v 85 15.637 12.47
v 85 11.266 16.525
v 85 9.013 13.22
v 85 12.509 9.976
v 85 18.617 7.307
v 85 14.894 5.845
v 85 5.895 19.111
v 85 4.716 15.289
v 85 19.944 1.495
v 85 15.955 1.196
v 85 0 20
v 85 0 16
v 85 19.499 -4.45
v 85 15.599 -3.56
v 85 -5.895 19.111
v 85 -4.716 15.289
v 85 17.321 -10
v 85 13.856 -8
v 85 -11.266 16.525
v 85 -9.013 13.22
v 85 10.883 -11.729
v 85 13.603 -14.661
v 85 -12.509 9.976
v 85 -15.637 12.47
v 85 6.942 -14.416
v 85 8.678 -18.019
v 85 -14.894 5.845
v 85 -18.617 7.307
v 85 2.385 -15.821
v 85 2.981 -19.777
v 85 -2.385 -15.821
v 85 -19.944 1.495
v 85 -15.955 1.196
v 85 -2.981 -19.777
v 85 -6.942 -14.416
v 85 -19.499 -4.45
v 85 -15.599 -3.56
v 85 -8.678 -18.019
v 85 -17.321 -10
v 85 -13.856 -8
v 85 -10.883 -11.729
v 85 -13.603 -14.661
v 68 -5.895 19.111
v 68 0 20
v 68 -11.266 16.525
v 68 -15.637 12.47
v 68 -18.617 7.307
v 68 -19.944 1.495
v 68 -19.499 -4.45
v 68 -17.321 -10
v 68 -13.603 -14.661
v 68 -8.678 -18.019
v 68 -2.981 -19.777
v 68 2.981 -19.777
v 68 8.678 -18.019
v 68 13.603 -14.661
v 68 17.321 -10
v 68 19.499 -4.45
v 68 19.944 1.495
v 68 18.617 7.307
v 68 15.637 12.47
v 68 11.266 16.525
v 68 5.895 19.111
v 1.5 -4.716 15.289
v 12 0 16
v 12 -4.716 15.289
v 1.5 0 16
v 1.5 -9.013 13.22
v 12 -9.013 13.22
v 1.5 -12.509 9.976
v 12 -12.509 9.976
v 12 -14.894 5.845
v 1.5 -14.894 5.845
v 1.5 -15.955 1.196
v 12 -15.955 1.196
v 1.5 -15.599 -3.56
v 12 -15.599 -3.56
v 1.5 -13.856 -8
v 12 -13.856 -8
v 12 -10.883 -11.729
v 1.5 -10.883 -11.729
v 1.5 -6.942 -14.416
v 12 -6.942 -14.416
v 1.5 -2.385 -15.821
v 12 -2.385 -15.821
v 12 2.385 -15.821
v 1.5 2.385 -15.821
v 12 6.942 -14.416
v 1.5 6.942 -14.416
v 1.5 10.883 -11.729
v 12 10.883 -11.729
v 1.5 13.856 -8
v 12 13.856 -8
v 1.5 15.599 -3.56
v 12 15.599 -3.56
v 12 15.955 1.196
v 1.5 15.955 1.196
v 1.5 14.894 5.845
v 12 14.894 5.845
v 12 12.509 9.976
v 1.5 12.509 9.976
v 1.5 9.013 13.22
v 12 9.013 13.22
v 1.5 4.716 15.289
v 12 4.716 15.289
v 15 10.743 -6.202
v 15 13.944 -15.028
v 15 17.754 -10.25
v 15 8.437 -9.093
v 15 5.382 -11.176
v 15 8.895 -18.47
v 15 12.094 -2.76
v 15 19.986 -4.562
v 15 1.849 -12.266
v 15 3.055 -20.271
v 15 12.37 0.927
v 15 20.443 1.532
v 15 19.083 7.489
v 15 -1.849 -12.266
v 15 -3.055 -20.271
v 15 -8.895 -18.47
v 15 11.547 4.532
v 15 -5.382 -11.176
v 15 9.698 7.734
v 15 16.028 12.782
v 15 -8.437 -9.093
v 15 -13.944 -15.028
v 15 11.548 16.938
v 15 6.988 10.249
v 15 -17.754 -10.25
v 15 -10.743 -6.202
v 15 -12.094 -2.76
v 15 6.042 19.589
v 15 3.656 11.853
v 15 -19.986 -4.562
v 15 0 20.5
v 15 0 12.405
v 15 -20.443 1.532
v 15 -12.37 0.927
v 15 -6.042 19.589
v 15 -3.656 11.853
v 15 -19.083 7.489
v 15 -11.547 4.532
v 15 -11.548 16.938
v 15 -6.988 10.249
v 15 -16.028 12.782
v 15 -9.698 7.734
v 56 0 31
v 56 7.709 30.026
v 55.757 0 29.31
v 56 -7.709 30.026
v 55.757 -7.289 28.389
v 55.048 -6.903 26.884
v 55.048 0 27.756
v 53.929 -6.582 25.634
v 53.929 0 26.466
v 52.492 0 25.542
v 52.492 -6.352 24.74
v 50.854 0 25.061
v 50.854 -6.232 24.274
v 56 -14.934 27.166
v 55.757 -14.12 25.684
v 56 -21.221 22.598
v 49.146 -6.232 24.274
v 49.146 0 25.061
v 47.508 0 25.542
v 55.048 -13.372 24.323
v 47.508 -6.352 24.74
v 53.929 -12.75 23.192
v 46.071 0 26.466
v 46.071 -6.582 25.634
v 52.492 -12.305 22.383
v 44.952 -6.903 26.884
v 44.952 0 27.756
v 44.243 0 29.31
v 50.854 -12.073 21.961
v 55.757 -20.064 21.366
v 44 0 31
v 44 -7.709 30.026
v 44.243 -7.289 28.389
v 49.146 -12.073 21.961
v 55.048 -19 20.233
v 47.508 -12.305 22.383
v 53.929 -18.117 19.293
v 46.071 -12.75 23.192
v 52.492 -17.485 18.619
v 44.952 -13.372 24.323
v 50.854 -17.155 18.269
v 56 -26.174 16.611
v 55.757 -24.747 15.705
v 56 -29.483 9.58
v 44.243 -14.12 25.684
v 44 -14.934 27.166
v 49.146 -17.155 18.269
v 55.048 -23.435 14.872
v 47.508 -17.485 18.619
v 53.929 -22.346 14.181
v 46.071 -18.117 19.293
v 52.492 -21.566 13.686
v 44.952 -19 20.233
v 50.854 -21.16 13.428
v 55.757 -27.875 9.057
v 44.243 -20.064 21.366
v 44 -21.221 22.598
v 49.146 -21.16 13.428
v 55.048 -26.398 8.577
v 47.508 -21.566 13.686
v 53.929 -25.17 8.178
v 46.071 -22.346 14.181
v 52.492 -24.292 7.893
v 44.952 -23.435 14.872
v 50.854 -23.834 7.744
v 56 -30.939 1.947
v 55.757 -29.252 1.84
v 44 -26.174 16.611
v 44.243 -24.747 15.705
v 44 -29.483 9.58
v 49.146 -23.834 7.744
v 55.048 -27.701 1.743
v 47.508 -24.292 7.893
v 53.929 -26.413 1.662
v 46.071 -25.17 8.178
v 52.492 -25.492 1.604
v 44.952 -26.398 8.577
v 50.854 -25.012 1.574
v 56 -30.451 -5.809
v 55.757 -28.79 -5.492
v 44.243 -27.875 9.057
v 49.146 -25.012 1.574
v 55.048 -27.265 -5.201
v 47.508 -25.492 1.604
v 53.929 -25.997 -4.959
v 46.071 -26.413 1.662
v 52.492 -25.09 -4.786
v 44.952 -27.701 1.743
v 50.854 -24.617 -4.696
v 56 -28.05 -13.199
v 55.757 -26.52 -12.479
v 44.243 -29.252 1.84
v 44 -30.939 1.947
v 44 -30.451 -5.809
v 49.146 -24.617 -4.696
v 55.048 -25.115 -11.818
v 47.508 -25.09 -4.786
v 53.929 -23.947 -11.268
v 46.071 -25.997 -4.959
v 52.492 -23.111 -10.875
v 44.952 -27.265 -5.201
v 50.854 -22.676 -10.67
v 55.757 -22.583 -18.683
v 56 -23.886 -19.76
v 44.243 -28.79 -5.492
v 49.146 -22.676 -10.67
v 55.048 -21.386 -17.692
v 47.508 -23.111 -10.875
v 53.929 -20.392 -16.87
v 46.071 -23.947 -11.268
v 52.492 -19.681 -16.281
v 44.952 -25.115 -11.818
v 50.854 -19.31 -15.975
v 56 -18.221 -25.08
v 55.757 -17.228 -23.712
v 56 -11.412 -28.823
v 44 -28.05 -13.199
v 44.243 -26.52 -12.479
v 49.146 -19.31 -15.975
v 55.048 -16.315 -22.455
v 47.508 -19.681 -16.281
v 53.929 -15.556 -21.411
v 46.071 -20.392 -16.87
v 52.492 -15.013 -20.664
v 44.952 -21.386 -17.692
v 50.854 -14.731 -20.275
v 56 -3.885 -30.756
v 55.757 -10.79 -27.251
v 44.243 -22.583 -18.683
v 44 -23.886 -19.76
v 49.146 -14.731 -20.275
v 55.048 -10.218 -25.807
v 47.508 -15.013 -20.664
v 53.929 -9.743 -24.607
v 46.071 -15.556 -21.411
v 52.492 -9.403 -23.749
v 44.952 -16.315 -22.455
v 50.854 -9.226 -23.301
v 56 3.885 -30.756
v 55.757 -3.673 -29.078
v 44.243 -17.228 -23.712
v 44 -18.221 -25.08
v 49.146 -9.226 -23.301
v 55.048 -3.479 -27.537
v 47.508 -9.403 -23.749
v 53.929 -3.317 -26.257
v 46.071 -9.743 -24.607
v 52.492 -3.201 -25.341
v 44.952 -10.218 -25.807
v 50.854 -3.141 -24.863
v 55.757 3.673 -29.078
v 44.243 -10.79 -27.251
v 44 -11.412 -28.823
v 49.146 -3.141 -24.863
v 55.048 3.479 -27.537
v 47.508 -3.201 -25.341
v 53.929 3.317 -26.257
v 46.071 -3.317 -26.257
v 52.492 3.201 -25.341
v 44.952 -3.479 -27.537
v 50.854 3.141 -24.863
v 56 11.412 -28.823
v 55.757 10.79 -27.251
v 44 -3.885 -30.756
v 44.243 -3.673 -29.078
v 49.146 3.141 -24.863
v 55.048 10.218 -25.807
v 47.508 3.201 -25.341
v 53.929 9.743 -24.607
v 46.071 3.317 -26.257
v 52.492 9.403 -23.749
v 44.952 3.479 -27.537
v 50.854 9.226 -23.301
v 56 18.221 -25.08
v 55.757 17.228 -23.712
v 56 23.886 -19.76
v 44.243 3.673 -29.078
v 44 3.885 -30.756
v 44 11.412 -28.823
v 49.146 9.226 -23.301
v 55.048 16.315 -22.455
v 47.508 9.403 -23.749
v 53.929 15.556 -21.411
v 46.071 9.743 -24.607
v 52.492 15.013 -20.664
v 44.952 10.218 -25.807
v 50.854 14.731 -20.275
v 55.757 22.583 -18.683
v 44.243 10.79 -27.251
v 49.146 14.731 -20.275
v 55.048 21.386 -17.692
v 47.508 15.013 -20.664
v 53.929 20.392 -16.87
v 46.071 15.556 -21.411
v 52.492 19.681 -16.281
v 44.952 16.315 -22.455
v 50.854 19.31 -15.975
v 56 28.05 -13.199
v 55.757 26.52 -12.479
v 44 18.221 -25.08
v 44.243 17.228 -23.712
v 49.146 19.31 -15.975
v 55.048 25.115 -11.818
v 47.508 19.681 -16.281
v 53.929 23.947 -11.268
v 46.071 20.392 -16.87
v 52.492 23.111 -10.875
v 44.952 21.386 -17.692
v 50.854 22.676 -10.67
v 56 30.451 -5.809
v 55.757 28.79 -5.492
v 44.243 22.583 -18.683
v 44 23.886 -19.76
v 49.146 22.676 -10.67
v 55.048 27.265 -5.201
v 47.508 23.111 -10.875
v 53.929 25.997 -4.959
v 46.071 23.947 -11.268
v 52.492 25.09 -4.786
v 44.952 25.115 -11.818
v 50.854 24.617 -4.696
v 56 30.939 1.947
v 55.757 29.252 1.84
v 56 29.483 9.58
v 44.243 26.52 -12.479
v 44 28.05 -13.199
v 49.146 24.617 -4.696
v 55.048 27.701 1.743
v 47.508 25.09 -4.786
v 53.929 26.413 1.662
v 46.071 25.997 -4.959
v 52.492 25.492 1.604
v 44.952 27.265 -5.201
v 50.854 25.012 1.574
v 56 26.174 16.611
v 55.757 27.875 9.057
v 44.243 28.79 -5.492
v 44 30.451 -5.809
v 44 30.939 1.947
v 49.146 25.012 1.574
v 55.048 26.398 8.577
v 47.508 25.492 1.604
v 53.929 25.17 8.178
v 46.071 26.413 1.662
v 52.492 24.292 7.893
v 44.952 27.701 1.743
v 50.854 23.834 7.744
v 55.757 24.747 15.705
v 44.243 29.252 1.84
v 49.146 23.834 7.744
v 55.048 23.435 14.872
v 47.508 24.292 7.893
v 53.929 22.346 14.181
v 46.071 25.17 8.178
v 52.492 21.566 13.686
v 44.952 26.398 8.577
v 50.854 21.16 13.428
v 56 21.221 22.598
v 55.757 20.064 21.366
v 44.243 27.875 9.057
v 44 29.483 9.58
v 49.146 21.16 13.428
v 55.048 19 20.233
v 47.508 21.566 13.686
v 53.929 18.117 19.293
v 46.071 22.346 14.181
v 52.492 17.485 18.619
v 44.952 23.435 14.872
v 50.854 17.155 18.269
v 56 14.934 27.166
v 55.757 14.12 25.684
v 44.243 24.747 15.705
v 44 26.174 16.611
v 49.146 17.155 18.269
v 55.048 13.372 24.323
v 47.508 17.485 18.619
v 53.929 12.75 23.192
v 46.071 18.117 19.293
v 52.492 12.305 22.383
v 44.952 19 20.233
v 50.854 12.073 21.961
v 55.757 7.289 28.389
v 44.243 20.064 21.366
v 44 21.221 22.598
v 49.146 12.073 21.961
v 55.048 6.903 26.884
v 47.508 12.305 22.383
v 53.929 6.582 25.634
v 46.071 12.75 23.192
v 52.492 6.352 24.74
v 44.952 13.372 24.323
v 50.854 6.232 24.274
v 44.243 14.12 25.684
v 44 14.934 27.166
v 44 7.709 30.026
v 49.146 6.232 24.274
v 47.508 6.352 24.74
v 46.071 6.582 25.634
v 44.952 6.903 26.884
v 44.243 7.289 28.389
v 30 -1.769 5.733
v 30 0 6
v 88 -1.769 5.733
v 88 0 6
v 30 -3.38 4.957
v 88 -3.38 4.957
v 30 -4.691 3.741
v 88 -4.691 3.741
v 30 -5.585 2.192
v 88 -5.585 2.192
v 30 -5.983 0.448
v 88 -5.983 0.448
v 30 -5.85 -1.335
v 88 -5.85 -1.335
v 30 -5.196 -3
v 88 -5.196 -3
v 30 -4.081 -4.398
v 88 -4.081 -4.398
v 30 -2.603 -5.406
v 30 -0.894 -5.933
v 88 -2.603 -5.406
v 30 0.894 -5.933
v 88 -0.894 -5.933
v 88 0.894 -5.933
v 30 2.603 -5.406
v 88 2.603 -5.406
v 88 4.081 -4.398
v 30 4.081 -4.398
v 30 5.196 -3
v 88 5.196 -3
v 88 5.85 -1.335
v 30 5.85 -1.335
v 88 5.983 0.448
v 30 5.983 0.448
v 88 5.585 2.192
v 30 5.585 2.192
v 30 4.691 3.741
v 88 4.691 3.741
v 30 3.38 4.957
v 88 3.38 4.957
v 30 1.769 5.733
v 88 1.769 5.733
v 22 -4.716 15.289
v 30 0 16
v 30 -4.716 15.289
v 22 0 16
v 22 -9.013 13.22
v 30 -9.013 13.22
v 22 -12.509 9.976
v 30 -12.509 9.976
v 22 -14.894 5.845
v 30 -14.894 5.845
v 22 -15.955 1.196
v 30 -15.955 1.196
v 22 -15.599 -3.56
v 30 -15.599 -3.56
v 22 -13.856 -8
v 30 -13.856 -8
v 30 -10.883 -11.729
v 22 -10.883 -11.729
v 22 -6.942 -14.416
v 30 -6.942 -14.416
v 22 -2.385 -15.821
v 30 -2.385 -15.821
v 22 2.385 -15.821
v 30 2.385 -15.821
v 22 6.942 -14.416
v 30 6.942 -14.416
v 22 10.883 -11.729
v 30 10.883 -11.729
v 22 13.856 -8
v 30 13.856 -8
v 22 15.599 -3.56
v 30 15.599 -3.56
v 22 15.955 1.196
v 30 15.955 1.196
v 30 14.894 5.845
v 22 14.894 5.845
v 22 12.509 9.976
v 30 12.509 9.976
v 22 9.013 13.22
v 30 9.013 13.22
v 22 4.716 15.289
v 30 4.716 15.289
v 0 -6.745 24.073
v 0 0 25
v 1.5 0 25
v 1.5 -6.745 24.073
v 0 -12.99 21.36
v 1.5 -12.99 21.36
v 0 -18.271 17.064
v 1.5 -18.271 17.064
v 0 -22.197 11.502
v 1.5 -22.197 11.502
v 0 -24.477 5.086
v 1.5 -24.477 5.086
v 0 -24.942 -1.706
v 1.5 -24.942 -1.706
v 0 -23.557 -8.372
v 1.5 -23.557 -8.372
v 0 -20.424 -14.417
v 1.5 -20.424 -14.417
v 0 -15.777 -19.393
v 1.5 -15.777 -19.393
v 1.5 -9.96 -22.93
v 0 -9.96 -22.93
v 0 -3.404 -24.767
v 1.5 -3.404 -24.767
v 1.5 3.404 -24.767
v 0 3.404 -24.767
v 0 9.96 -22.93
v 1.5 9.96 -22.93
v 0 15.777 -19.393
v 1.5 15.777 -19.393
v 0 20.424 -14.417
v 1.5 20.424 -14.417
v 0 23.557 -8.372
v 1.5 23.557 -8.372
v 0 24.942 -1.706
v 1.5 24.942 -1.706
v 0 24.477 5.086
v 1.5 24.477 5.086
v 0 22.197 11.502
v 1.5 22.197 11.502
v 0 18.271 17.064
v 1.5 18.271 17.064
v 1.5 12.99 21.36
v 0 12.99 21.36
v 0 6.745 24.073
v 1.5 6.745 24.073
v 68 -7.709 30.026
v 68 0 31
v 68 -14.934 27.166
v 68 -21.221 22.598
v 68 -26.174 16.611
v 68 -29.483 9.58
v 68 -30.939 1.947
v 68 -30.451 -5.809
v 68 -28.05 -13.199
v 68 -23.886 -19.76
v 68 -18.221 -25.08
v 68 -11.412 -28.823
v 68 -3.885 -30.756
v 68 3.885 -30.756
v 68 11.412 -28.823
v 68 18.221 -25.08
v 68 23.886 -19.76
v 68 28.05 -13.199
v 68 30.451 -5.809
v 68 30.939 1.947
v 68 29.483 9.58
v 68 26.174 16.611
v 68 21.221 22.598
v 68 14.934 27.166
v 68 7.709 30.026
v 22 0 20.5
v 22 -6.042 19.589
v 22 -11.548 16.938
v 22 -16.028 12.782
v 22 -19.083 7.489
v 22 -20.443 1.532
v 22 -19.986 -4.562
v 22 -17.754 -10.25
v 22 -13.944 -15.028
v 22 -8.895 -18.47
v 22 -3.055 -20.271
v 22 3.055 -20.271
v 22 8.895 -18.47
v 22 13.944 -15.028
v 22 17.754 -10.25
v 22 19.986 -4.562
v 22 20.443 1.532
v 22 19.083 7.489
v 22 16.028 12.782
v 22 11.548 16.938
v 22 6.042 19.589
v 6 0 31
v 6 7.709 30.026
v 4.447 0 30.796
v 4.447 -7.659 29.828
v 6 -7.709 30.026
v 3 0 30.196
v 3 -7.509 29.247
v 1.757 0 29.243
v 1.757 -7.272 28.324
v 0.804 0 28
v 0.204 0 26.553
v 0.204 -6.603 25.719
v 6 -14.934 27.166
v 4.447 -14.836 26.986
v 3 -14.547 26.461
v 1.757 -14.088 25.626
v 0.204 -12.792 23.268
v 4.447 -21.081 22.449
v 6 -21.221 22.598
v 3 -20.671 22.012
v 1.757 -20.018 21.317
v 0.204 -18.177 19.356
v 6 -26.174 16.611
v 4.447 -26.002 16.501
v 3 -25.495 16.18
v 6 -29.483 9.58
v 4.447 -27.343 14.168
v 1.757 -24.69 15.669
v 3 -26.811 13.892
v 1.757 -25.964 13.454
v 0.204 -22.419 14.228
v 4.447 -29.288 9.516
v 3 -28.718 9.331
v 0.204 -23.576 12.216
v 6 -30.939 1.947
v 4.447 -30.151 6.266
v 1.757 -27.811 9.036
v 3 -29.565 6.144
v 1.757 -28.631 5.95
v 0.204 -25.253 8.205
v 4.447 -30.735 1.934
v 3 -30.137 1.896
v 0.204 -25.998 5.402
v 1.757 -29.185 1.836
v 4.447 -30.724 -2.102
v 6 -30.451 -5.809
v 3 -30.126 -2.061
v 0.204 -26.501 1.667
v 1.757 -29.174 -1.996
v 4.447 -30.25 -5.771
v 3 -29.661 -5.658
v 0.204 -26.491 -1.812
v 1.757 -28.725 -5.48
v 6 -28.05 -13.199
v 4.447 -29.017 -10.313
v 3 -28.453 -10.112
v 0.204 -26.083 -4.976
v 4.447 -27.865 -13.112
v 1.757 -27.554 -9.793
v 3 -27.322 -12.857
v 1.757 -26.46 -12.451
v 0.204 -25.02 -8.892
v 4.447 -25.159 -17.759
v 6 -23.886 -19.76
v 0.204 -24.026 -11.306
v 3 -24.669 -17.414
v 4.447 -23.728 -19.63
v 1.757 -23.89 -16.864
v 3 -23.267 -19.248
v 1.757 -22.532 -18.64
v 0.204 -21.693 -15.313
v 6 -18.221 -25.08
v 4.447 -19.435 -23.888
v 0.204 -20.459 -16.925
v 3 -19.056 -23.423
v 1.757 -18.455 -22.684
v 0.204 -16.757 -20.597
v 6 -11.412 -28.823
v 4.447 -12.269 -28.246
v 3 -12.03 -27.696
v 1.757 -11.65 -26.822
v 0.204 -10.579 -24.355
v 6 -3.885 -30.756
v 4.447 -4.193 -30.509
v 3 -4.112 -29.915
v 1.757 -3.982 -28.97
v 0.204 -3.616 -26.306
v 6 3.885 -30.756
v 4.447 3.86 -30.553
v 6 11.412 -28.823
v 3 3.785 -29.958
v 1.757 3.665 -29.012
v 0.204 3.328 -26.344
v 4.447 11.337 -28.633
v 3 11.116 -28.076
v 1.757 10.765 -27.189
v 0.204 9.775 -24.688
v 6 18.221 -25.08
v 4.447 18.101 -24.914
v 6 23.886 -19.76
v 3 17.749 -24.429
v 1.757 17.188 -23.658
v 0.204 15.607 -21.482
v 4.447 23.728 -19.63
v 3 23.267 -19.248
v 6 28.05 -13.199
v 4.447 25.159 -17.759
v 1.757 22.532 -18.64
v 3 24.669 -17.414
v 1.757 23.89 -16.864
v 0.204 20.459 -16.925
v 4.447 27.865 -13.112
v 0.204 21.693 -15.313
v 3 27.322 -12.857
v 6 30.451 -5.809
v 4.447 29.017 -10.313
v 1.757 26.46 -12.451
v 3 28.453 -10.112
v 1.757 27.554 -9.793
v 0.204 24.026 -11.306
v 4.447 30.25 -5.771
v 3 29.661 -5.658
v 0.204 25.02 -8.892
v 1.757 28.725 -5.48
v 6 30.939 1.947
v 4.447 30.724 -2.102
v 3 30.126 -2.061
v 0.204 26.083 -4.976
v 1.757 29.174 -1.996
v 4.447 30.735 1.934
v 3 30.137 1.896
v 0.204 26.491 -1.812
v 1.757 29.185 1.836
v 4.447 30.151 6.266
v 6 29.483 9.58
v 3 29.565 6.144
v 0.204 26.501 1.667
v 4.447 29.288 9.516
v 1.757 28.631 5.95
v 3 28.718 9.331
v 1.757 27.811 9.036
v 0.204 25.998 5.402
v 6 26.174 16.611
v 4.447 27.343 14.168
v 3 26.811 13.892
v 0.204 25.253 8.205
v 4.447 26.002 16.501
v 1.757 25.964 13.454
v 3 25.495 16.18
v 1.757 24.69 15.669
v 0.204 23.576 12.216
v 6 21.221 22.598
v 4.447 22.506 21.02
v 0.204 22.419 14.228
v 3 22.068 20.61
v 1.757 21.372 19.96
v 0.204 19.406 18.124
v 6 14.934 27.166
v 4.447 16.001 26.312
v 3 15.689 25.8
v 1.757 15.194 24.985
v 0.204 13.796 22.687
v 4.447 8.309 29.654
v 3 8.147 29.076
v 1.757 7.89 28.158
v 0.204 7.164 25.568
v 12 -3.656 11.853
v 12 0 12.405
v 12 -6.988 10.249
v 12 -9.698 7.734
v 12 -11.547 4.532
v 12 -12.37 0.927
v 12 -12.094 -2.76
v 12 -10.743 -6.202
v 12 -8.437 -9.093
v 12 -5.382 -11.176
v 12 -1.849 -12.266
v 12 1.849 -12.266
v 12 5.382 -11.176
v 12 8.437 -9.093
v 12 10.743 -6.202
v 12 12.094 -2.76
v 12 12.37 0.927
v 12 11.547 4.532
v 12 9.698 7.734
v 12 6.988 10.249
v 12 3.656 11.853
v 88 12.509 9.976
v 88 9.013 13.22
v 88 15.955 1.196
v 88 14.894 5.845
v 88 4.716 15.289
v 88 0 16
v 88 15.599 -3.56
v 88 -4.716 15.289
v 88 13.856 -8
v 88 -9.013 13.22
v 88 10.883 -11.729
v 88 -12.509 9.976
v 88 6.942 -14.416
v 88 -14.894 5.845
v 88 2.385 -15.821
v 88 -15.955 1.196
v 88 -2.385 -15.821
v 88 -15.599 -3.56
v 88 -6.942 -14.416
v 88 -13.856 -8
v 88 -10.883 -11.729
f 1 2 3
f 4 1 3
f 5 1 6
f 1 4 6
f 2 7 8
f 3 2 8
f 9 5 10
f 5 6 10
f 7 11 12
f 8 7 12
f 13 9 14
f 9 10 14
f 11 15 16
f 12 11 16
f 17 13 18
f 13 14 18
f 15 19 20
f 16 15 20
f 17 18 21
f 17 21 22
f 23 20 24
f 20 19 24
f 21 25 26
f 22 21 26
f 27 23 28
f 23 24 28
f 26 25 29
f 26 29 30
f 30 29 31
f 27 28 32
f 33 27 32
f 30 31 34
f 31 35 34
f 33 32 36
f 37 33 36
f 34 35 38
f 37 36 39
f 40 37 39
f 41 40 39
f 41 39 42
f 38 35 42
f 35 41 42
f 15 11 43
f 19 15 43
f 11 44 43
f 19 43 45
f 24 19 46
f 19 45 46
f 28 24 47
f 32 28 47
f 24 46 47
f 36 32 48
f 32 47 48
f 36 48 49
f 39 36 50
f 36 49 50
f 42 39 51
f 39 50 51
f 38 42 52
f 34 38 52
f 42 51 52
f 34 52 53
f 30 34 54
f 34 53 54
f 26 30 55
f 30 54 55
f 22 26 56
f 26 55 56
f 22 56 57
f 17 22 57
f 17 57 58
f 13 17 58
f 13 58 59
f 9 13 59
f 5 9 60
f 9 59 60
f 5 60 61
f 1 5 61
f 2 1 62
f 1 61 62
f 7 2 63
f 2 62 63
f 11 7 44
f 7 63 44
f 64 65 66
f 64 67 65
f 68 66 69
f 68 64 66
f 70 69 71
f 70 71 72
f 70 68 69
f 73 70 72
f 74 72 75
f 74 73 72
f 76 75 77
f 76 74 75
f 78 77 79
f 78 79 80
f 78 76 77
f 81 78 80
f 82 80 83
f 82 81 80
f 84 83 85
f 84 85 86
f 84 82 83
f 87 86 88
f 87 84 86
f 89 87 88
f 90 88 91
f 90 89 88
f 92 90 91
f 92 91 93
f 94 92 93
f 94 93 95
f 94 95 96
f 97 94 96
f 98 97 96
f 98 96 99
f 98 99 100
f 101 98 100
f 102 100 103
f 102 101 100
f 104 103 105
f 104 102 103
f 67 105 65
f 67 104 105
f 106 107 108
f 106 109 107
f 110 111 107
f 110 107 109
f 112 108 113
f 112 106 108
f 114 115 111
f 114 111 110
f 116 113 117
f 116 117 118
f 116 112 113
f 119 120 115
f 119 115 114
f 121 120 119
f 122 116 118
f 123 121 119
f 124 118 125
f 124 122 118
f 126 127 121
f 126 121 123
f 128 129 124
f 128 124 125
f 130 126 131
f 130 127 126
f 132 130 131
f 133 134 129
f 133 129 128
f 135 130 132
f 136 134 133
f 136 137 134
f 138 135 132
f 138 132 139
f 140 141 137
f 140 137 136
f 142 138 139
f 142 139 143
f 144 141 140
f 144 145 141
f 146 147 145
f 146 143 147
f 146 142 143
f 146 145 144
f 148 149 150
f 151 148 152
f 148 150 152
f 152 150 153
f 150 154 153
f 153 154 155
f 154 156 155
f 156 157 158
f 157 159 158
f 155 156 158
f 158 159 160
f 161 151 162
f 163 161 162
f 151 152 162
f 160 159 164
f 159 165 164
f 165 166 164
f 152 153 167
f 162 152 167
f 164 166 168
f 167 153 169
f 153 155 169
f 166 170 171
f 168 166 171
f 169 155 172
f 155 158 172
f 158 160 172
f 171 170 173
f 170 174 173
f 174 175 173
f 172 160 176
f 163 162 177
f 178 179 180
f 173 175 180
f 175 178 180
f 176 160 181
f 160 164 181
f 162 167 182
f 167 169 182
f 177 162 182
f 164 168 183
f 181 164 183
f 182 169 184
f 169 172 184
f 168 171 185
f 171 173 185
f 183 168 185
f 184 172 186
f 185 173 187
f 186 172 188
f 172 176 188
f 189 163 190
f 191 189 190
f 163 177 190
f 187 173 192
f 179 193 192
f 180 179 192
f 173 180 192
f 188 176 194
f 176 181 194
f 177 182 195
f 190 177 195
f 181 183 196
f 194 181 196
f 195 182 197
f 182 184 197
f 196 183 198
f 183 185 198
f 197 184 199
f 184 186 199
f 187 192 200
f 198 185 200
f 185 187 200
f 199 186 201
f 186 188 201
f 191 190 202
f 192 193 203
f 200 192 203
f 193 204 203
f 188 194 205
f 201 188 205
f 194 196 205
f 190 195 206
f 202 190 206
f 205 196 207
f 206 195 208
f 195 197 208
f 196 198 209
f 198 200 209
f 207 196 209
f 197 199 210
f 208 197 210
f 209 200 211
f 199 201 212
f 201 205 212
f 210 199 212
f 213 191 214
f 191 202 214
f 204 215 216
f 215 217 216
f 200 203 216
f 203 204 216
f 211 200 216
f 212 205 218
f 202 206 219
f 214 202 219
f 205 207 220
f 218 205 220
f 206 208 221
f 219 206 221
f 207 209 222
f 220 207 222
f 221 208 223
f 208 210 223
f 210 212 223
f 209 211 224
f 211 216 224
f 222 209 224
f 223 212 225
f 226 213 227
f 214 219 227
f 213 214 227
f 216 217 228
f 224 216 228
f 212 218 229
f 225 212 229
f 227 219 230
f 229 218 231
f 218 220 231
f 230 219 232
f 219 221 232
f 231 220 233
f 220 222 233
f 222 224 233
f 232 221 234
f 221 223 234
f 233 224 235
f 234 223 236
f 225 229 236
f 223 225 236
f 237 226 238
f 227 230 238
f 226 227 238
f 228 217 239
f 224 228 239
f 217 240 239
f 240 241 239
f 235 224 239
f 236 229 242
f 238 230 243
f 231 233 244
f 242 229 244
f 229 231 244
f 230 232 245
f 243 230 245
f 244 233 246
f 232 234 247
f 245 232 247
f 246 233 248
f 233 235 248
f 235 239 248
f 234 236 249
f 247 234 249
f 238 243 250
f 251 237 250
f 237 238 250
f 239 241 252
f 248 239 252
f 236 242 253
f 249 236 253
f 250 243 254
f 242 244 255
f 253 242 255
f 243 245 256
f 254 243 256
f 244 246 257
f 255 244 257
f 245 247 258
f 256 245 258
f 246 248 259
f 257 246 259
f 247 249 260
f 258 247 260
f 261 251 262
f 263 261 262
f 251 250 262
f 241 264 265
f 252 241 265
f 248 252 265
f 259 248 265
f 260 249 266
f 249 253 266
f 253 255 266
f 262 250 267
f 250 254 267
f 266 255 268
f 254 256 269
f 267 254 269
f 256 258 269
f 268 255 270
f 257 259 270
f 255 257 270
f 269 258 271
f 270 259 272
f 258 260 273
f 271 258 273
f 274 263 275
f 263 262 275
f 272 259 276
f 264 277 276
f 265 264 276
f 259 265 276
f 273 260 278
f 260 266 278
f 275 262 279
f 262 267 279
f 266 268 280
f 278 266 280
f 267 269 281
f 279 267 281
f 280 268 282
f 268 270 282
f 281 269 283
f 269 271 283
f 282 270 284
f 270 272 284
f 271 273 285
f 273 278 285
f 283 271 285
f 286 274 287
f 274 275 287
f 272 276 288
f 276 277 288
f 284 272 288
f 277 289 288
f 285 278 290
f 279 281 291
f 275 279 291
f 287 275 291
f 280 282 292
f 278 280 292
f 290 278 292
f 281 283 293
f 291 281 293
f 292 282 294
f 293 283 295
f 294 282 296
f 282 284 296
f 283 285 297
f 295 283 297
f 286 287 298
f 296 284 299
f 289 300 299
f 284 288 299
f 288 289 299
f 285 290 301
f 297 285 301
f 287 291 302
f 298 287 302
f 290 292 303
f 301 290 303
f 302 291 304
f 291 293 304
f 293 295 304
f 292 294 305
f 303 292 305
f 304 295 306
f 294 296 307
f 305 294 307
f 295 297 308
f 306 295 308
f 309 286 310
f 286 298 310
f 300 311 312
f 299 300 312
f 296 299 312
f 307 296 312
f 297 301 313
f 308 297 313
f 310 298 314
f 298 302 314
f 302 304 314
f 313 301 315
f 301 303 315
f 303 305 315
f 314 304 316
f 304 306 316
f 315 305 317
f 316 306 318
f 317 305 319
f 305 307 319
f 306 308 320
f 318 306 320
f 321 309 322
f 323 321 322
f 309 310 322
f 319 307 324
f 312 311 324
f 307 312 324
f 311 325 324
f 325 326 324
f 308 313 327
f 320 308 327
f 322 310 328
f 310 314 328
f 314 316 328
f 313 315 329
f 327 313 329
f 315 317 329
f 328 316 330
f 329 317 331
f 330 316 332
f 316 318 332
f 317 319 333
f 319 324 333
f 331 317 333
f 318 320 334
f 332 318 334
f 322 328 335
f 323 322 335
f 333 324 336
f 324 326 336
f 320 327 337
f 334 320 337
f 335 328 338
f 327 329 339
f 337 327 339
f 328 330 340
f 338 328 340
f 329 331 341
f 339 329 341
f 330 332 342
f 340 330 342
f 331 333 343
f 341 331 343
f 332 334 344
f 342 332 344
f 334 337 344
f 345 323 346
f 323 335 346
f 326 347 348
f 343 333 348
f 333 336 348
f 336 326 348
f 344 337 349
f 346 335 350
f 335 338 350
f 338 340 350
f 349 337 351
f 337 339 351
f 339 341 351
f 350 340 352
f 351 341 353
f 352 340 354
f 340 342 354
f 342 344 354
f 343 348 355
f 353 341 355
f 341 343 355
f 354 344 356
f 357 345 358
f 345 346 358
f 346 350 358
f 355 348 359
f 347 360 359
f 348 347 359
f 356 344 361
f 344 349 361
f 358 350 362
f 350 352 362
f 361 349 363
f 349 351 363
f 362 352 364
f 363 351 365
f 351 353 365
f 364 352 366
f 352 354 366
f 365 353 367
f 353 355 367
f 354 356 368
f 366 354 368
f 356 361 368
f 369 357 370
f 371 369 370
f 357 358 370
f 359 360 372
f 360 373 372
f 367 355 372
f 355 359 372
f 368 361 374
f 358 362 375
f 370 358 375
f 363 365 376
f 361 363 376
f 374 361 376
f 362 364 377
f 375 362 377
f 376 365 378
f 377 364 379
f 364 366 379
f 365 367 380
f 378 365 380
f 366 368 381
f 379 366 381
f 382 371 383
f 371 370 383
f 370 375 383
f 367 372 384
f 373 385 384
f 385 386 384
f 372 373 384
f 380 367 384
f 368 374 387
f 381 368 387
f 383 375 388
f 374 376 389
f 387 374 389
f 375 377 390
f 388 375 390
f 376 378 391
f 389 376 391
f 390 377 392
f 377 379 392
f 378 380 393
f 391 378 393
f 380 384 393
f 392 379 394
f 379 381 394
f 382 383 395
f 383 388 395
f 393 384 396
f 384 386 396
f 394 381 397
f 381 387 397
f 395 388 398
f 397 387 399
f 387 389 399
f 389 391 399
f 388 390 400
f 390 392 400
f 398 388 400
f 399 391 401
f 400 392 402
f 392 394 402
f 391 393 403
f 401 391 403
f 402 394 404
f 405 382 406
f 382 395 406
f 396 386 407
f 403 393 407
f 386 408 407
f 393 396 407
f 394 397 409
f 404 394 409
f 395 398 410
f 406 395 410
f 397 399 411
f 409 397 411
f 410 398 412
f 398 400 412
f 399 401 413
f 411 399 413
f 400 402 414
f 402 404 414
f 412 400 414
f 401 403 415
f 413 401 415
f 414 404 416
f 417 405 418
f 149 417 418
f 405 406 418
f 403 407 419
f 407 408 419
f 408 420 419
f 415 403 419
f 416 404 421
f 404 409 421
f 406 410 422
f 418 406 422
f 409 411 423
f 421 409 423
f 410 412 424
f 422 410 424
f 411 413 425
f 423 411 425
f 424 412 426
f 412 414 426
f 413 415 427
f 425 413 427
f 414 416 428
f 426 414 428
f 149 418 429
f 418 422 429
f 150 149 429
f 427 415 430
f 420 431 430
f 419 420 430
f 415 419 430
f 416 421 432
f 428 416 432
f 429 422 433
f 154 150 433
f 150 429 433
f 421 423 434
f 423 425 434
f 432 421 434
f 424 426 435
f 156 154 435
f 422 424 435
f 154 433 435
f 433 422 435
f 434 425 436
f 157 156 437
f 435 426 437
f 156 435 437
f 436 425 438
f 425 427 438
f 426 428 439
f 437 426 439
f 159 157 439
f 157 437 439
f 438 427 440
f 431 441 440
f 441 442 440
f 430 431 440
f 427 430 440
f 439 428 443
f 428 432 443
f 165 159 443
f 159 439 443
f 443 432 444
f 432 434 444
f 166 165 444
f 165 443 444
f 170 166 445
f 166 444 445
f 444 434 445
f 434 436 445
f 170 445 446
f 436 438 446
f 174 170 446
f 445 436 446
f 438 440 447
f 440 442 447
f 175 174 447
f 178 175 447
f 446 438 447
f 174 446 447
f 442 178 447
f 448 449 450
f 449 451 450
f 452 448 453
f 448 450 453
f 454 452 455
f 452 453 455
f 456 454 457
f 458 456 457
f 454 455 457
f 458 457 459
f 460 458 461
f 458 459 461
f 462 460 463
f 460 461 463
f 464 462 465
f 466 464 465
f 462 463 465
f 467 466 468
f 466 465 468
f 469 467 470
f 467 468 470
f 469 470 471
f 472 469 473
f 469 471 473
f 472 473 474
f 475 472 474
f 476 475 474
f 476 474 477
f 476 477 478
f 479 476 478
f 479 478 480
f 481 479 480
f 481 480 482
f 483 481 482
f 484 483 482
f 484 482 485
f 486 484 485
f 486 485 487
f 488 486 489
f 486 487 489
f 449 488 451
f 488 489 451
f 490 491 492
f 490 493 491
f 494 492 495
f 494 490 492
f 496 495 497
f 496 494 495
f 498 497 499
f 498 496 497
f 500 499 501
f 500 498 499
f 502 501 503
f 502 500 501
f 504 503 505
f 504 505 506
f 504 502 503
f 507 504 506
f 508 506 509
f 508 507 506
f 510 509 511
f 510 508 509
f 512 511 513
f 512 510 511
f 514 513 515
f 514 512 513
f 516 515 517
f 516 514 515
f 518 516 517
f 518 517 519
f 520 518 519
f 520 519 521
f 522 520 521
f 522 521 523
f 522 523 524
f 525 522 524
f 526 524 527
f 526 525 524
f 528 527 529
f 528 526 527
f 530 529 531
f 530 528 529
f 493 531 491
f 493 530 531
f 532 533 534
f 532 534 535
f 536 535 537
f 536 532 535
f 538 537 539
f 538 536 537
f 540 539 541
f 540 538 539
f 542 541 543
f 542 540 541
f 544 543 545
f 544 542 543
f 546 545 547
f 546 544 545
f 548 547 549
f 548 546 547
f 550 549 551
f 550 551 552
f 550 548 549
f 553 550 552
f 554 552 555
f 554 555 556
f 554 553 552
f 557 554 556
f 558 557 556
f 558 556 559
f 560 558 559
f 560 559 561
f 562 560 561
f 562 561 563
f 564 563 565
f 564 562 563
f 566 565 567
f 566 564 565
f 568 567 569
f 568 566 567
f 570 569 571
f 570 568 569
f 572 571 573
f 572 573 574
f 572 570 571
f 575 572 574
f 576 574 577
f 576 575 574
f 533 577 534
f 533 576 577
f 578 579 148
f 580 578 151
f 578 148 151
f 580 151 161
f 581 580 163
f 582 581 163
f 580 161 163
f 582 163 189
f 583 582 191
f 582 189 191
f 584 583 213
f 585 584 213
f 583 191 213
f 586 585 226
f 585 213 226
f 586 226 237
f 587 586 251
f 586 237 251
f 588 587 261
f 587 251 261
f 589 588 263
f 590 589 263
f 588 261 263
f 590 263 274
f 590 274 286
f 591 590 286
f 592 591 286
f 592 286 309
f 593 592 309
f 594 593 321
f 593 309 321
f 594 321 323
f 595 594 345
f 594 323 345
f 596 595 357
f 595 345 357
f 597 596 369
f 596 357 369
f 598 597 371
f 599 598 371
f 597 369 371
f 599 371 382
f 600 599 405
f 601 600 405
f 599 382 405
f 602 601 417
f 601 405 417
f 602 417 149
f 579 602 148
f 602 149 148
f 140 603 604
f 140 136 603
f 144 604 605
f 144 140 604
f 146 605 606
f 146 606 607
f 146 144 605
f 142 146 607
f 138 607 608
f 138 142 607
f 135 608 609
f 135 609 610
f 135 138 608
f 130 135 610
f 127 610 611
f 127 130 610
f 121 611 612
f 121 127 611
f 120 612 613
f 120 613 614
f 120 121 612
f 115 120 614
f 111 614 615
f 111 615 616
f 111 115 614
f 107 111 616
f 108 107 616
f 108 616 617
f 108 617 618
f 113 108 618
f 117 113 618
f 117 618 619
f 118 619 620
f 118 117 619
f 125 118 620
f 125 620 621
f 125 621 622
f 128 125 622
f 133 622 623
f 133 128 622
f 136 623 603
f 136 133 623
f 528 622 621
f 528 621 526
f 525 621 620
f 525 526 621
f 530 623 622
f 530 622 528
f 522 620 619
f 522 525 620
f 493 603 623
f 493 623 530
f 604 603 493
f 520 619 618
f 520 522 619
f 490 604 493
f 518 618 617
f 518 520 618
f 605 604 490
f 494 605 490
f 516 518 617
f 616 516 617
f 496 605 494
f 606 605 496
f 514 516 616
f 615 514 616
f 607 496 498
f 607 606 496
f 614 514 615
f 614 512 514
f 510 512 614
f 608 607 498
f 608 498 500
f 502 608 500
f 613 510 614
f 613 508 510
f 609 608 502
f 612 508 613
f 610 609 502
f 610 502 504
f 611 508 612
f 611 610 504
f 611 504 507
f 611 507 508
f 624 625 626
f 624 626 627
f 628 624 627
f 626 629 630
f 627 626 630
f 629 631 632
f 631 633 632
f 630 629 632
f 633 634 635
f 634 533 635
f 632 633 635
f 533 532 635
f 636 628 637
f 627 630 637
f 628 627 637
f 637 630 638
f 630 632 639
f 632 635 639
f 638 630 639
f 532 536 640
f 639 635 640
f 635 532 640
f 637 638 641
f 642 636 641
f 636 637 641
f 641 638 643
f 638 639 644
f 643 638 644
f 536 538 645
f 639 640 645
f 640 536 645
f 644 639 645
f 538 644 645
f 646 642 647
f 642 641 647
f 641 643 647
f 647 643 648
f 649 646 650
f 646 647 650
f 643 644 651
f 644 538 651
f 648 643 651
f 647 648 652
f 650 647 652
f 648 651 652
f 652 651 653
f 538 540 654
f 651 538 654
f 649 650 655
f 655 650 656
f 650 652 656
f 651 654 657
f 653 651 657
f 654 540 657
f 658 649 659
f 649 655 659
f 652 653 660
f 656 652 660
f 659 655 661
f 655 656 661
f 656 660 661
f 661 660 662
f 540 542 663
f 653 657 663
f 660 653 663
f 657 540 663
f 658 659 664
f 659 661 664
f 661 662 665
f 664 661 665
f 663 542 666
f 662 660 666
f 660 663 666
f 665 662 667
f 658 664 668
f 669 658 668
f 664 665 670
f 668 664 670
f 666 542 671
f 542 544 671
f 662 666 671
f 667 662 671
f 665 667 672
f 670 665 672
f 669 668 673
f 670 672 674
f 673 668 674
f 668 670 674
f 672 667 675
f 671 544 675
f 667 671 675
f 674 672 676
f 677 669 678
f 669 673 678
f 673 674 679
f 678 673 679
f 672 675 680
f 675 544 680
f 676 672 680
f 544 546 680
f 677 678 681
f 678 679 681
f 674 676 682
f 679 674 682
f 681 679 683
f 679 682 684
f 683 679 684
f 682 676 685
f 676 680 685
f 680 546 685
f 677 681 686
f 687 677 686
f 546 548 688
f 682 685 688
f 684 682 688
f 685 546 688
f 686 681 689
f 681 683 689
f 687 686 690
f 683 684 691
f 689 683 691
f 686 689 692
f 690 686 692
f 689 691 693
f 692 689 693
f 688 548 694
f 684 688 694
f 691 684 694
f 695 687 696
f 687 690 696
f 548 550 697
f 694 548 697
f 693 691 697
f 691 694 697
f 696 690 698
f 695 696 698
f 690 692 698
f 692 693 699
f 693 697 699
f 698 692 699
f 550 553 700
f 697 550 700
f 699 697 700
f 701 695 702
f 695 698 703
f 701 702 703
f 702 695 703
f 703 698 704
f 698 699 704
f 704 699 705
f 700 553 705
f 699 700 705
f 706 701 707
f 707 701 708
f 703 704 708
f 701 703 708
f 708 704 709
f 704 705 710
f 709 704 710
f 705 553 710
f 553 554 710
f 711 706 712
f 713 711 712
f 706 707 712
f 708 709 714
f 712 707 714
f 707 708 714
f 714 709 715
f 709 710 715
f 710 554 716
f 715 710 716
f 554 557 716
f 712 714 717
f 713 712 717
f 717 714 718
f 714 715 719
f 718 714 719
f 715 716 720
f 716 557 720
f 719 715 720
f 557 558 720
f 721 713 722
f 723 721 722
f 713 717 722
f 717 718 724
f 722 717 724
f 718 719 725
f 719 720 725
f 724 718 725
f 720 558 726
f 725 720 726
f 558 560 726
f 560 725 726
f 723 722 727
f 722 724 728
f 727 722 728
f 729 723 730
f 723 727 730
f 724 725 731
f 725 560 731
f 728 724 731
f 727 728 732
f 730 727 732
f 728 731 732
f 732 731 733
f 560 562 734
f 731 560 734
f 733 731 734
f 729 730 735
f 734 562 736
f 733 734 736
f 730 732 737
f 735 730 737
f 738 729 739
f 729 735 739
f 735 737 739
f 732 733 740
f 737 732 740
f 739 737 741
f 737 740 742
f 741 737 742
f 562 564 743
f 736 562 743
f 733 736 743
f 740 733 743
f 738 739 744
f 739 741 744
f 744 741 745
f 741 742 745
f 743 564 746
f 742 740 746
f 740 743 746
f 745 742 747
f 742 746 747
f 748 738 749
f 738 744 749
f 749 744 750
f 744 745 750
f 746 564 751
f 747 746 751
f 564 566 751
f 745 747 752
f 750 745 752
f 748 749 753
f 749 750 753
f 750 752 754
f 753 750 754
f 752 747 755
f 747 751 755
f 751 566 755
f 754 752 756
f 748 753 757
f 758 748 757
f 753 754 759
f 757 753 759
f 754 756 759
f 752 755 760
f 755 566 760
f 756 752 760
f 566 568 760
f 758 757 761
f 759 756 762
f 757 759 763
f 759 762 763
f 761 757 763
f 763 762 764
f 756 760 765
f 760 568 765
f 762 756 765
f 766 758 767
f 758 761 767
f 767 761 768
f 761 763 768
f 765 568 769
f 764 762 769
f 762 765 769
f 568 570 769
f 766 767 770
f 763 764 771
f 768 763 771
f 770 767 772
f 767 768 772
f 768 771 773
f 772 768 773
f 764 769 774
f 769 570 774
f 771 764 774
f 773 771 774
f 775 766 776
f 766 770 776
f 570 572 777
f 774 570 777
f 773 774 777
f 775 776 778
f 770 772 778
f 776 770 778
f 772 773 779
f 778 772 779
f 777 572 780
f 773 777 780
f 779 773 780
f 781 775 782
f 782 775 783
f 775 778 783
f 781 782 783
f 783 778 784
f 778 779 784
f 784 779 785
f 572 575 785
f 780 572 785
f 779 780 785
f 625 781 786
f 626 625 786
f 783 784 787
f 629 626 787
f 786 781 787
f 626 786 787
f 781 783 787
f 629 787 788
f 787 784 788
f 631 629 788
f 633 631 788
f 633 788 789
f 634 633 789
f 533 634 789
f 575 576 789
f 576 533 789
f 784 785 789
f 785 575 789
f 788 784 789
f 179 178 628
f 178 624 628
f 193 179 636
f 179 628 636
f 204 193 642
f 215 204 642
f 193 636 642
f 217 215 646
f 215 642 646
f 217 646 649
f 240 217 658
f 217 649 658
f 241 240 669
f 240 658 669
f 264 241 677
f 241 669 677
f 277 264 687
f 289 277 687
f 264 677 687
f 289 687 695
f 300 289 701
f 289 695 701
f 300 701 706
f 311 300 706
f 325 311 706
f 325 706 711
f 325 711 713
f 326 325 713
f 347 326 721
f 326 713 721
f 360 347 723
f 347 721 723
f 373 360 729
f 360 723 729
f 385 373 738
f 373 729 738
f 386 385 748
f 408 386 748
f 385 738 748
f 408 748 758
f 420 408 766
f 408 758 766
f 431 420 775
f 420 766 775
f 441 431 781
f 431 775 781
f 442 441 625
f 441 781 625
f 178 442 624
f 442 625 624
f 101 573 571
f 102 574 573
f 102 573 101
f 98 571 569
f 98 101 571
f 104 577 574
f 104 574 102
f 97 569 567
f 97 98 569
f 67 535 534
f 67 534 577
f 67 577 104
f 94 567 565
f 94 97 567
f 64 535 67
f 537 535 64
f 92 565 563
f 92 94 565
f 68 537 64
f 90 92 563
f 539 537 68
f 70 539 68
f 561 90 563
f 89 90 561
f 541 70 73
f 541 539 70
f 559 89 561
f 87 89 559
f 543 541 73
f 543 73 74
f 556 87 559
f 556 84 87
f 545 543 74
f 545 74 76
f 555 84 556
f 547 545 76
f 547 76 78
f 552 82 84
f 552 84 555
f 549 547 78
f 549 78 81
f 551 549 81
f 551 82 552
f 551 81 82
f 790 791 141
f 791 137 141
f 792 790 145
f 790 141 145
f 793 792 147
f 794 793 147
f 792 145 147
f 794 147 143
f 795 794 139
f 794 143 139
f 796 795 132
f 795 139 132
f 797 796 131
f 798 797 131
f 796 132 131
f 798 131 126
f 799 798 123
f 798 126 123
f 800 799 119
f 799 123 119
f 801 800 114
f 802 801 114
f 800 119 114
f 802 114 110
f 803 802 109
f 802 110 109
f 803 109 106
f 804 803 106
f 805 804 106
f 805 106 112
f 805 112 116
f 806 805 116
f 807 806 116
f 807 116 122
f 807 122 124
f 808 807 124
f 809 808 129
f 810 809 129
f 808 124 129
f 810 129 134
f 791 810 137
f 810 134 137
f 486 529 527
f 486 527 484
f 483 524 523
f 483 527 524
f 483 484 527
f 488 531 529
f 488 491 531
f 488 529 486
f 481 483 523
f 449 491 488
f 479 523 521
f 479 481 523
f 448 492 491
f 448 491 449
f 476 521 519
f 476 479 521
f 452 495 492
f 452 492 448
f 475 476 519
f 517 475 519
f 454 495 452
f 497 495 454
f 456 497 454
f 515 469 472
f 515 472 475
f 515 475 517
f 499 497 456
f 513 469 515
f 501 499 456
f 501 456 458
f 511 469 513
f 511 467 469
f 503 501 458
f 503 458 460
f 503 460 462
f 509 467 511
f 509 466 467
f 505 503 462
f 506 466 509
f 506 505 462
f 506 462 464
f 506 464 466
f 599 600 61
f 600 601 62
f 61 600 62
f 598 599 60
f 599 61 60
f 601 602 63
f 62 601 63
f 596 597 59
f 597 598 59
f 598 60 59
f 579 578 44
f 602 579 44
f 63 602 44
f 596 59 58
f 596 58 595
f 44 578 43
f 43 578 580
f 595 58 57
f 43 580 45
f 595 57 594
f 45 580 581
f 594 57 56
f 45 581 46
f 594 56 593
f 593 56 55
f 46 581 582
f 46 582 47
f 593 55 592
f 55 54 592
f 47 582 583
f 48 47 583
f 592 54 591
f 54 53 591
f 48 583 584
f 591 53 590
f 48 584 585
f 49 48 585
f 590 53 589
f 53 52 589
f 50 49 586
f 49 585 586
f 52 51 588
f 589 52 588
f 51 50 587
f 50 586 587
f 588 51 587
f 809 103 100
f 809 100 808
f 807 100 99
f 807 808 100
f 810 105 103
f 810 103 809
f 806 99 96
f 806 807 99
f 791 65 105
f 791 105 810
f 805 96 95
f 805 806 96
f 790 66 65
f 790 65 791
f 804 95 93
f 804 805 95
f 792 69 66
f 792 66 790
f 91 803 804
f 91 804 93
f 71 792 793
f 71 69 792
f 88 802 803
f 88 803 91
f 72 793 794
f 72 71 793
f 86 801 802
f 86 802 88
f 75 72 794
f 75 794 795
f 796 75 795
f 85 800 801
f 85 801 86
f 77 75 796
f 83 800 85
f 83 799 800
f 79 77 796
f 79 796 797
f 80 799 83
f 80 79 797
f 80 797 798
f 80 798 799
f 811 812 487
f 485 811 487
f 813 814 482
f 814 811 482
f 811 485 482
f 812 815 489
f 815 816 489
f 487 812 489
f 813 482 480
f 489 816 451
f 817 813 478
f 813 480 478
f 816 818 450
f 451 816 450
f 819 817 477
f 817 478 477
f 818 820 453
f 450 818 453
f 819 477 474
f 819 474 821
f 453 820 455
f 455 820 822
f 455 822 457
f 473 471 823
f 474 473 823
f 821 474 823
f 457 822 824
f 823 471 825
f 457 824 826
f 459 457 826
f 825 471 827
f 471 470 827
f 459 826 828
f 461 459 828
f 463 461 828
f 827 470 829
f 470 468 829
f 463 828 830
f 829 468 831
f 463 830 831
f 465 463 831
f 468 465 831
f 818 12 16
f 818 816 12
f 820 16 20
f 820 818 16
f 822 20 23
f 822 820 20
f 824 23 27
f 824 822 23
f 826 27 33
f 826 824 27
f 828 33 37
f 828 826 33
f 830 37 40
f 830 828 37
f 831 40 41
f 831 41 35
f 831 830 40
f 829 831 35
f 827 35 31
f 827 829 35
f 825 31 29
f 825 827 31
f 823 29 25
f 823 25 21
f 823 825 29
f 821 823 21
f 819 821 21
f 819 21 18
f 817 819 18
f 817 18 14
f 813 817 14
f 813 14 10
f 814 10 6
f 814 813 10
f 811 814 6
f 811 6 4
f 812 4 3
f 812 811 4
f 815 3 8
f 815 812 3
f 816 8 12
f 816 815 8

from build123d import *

# Parameters (mm, degrees)
F0_W   = 3
F0_H   = 16
F2_W   = 3
F2_H   = 12.4045886115
F2_W_2 = 58
F2_H_2 = 6


with BuildPart() as f1:
    # F0 (on Front) → F1 (revolve)
    with BuildSketch(Plane.XZ):
        with BuildLine():
            Line((0, 25), (0, 0))
            Line((0, 0), (44, 0))
            Line((44, 0), (44, 31))
            Line((44, 31), (6, 31))
            ThreePointArc((6, 31), (1.7573593129, 29.2426406871), (0, 25))
        make_face()
        with BuildLine():
            Line((44, 31), (44, 0))
            Line((44, 0), (56, 0))
            Line((56, 0), (56, 31))
            ThreePointArc((56, 31), (50, 25), (44, 31))
        make_face()
        Polygon((56, 31), (56, 0), (68, 0), (68, 20), (68, 31), align=None)
        Polygon((68, 20), (68, 0), (85, 0), (85, 16), (85, 20), align=None)
        with Locations((86.5, 8)):
            Rectangle(F0_W, F0_H)
    revolve(axis=Axis((44, 0, 0), (1, 0, 0)))

    # F2 (on Front) → F3 (revolve, cut)
    with BuildSketch(Plane.XZ):
        Polygon((0, 25), (0, 0), (1.5, 0), (1.5, 16), (1.5, 25), align=None)
        Polygon((1.5, 16), (1.5, 0), (12, 0), (12, 12.4045886115), (12, 16), align=None)
        with Locations((13.5, 6.2022943057)):
            Rectangle(F2_W, F2_H)
        Polygon((15, 12.4045886115), (15, 0), (22, 0), (22, 16), (22, 20.5), (15, 20.5), align=None)
        Polygon((22, 16), (22, 0), (30, 0), (30, 6), (30, 16), align=None)
        with Locations((59, 3)):
            Rectangle(F2_W_2, F2_H_2)
    revolve(axis=Axis((44, 0, 0), (1, 0, 0)), mode=Mode.SUBTRACT)


solid = f1.part
